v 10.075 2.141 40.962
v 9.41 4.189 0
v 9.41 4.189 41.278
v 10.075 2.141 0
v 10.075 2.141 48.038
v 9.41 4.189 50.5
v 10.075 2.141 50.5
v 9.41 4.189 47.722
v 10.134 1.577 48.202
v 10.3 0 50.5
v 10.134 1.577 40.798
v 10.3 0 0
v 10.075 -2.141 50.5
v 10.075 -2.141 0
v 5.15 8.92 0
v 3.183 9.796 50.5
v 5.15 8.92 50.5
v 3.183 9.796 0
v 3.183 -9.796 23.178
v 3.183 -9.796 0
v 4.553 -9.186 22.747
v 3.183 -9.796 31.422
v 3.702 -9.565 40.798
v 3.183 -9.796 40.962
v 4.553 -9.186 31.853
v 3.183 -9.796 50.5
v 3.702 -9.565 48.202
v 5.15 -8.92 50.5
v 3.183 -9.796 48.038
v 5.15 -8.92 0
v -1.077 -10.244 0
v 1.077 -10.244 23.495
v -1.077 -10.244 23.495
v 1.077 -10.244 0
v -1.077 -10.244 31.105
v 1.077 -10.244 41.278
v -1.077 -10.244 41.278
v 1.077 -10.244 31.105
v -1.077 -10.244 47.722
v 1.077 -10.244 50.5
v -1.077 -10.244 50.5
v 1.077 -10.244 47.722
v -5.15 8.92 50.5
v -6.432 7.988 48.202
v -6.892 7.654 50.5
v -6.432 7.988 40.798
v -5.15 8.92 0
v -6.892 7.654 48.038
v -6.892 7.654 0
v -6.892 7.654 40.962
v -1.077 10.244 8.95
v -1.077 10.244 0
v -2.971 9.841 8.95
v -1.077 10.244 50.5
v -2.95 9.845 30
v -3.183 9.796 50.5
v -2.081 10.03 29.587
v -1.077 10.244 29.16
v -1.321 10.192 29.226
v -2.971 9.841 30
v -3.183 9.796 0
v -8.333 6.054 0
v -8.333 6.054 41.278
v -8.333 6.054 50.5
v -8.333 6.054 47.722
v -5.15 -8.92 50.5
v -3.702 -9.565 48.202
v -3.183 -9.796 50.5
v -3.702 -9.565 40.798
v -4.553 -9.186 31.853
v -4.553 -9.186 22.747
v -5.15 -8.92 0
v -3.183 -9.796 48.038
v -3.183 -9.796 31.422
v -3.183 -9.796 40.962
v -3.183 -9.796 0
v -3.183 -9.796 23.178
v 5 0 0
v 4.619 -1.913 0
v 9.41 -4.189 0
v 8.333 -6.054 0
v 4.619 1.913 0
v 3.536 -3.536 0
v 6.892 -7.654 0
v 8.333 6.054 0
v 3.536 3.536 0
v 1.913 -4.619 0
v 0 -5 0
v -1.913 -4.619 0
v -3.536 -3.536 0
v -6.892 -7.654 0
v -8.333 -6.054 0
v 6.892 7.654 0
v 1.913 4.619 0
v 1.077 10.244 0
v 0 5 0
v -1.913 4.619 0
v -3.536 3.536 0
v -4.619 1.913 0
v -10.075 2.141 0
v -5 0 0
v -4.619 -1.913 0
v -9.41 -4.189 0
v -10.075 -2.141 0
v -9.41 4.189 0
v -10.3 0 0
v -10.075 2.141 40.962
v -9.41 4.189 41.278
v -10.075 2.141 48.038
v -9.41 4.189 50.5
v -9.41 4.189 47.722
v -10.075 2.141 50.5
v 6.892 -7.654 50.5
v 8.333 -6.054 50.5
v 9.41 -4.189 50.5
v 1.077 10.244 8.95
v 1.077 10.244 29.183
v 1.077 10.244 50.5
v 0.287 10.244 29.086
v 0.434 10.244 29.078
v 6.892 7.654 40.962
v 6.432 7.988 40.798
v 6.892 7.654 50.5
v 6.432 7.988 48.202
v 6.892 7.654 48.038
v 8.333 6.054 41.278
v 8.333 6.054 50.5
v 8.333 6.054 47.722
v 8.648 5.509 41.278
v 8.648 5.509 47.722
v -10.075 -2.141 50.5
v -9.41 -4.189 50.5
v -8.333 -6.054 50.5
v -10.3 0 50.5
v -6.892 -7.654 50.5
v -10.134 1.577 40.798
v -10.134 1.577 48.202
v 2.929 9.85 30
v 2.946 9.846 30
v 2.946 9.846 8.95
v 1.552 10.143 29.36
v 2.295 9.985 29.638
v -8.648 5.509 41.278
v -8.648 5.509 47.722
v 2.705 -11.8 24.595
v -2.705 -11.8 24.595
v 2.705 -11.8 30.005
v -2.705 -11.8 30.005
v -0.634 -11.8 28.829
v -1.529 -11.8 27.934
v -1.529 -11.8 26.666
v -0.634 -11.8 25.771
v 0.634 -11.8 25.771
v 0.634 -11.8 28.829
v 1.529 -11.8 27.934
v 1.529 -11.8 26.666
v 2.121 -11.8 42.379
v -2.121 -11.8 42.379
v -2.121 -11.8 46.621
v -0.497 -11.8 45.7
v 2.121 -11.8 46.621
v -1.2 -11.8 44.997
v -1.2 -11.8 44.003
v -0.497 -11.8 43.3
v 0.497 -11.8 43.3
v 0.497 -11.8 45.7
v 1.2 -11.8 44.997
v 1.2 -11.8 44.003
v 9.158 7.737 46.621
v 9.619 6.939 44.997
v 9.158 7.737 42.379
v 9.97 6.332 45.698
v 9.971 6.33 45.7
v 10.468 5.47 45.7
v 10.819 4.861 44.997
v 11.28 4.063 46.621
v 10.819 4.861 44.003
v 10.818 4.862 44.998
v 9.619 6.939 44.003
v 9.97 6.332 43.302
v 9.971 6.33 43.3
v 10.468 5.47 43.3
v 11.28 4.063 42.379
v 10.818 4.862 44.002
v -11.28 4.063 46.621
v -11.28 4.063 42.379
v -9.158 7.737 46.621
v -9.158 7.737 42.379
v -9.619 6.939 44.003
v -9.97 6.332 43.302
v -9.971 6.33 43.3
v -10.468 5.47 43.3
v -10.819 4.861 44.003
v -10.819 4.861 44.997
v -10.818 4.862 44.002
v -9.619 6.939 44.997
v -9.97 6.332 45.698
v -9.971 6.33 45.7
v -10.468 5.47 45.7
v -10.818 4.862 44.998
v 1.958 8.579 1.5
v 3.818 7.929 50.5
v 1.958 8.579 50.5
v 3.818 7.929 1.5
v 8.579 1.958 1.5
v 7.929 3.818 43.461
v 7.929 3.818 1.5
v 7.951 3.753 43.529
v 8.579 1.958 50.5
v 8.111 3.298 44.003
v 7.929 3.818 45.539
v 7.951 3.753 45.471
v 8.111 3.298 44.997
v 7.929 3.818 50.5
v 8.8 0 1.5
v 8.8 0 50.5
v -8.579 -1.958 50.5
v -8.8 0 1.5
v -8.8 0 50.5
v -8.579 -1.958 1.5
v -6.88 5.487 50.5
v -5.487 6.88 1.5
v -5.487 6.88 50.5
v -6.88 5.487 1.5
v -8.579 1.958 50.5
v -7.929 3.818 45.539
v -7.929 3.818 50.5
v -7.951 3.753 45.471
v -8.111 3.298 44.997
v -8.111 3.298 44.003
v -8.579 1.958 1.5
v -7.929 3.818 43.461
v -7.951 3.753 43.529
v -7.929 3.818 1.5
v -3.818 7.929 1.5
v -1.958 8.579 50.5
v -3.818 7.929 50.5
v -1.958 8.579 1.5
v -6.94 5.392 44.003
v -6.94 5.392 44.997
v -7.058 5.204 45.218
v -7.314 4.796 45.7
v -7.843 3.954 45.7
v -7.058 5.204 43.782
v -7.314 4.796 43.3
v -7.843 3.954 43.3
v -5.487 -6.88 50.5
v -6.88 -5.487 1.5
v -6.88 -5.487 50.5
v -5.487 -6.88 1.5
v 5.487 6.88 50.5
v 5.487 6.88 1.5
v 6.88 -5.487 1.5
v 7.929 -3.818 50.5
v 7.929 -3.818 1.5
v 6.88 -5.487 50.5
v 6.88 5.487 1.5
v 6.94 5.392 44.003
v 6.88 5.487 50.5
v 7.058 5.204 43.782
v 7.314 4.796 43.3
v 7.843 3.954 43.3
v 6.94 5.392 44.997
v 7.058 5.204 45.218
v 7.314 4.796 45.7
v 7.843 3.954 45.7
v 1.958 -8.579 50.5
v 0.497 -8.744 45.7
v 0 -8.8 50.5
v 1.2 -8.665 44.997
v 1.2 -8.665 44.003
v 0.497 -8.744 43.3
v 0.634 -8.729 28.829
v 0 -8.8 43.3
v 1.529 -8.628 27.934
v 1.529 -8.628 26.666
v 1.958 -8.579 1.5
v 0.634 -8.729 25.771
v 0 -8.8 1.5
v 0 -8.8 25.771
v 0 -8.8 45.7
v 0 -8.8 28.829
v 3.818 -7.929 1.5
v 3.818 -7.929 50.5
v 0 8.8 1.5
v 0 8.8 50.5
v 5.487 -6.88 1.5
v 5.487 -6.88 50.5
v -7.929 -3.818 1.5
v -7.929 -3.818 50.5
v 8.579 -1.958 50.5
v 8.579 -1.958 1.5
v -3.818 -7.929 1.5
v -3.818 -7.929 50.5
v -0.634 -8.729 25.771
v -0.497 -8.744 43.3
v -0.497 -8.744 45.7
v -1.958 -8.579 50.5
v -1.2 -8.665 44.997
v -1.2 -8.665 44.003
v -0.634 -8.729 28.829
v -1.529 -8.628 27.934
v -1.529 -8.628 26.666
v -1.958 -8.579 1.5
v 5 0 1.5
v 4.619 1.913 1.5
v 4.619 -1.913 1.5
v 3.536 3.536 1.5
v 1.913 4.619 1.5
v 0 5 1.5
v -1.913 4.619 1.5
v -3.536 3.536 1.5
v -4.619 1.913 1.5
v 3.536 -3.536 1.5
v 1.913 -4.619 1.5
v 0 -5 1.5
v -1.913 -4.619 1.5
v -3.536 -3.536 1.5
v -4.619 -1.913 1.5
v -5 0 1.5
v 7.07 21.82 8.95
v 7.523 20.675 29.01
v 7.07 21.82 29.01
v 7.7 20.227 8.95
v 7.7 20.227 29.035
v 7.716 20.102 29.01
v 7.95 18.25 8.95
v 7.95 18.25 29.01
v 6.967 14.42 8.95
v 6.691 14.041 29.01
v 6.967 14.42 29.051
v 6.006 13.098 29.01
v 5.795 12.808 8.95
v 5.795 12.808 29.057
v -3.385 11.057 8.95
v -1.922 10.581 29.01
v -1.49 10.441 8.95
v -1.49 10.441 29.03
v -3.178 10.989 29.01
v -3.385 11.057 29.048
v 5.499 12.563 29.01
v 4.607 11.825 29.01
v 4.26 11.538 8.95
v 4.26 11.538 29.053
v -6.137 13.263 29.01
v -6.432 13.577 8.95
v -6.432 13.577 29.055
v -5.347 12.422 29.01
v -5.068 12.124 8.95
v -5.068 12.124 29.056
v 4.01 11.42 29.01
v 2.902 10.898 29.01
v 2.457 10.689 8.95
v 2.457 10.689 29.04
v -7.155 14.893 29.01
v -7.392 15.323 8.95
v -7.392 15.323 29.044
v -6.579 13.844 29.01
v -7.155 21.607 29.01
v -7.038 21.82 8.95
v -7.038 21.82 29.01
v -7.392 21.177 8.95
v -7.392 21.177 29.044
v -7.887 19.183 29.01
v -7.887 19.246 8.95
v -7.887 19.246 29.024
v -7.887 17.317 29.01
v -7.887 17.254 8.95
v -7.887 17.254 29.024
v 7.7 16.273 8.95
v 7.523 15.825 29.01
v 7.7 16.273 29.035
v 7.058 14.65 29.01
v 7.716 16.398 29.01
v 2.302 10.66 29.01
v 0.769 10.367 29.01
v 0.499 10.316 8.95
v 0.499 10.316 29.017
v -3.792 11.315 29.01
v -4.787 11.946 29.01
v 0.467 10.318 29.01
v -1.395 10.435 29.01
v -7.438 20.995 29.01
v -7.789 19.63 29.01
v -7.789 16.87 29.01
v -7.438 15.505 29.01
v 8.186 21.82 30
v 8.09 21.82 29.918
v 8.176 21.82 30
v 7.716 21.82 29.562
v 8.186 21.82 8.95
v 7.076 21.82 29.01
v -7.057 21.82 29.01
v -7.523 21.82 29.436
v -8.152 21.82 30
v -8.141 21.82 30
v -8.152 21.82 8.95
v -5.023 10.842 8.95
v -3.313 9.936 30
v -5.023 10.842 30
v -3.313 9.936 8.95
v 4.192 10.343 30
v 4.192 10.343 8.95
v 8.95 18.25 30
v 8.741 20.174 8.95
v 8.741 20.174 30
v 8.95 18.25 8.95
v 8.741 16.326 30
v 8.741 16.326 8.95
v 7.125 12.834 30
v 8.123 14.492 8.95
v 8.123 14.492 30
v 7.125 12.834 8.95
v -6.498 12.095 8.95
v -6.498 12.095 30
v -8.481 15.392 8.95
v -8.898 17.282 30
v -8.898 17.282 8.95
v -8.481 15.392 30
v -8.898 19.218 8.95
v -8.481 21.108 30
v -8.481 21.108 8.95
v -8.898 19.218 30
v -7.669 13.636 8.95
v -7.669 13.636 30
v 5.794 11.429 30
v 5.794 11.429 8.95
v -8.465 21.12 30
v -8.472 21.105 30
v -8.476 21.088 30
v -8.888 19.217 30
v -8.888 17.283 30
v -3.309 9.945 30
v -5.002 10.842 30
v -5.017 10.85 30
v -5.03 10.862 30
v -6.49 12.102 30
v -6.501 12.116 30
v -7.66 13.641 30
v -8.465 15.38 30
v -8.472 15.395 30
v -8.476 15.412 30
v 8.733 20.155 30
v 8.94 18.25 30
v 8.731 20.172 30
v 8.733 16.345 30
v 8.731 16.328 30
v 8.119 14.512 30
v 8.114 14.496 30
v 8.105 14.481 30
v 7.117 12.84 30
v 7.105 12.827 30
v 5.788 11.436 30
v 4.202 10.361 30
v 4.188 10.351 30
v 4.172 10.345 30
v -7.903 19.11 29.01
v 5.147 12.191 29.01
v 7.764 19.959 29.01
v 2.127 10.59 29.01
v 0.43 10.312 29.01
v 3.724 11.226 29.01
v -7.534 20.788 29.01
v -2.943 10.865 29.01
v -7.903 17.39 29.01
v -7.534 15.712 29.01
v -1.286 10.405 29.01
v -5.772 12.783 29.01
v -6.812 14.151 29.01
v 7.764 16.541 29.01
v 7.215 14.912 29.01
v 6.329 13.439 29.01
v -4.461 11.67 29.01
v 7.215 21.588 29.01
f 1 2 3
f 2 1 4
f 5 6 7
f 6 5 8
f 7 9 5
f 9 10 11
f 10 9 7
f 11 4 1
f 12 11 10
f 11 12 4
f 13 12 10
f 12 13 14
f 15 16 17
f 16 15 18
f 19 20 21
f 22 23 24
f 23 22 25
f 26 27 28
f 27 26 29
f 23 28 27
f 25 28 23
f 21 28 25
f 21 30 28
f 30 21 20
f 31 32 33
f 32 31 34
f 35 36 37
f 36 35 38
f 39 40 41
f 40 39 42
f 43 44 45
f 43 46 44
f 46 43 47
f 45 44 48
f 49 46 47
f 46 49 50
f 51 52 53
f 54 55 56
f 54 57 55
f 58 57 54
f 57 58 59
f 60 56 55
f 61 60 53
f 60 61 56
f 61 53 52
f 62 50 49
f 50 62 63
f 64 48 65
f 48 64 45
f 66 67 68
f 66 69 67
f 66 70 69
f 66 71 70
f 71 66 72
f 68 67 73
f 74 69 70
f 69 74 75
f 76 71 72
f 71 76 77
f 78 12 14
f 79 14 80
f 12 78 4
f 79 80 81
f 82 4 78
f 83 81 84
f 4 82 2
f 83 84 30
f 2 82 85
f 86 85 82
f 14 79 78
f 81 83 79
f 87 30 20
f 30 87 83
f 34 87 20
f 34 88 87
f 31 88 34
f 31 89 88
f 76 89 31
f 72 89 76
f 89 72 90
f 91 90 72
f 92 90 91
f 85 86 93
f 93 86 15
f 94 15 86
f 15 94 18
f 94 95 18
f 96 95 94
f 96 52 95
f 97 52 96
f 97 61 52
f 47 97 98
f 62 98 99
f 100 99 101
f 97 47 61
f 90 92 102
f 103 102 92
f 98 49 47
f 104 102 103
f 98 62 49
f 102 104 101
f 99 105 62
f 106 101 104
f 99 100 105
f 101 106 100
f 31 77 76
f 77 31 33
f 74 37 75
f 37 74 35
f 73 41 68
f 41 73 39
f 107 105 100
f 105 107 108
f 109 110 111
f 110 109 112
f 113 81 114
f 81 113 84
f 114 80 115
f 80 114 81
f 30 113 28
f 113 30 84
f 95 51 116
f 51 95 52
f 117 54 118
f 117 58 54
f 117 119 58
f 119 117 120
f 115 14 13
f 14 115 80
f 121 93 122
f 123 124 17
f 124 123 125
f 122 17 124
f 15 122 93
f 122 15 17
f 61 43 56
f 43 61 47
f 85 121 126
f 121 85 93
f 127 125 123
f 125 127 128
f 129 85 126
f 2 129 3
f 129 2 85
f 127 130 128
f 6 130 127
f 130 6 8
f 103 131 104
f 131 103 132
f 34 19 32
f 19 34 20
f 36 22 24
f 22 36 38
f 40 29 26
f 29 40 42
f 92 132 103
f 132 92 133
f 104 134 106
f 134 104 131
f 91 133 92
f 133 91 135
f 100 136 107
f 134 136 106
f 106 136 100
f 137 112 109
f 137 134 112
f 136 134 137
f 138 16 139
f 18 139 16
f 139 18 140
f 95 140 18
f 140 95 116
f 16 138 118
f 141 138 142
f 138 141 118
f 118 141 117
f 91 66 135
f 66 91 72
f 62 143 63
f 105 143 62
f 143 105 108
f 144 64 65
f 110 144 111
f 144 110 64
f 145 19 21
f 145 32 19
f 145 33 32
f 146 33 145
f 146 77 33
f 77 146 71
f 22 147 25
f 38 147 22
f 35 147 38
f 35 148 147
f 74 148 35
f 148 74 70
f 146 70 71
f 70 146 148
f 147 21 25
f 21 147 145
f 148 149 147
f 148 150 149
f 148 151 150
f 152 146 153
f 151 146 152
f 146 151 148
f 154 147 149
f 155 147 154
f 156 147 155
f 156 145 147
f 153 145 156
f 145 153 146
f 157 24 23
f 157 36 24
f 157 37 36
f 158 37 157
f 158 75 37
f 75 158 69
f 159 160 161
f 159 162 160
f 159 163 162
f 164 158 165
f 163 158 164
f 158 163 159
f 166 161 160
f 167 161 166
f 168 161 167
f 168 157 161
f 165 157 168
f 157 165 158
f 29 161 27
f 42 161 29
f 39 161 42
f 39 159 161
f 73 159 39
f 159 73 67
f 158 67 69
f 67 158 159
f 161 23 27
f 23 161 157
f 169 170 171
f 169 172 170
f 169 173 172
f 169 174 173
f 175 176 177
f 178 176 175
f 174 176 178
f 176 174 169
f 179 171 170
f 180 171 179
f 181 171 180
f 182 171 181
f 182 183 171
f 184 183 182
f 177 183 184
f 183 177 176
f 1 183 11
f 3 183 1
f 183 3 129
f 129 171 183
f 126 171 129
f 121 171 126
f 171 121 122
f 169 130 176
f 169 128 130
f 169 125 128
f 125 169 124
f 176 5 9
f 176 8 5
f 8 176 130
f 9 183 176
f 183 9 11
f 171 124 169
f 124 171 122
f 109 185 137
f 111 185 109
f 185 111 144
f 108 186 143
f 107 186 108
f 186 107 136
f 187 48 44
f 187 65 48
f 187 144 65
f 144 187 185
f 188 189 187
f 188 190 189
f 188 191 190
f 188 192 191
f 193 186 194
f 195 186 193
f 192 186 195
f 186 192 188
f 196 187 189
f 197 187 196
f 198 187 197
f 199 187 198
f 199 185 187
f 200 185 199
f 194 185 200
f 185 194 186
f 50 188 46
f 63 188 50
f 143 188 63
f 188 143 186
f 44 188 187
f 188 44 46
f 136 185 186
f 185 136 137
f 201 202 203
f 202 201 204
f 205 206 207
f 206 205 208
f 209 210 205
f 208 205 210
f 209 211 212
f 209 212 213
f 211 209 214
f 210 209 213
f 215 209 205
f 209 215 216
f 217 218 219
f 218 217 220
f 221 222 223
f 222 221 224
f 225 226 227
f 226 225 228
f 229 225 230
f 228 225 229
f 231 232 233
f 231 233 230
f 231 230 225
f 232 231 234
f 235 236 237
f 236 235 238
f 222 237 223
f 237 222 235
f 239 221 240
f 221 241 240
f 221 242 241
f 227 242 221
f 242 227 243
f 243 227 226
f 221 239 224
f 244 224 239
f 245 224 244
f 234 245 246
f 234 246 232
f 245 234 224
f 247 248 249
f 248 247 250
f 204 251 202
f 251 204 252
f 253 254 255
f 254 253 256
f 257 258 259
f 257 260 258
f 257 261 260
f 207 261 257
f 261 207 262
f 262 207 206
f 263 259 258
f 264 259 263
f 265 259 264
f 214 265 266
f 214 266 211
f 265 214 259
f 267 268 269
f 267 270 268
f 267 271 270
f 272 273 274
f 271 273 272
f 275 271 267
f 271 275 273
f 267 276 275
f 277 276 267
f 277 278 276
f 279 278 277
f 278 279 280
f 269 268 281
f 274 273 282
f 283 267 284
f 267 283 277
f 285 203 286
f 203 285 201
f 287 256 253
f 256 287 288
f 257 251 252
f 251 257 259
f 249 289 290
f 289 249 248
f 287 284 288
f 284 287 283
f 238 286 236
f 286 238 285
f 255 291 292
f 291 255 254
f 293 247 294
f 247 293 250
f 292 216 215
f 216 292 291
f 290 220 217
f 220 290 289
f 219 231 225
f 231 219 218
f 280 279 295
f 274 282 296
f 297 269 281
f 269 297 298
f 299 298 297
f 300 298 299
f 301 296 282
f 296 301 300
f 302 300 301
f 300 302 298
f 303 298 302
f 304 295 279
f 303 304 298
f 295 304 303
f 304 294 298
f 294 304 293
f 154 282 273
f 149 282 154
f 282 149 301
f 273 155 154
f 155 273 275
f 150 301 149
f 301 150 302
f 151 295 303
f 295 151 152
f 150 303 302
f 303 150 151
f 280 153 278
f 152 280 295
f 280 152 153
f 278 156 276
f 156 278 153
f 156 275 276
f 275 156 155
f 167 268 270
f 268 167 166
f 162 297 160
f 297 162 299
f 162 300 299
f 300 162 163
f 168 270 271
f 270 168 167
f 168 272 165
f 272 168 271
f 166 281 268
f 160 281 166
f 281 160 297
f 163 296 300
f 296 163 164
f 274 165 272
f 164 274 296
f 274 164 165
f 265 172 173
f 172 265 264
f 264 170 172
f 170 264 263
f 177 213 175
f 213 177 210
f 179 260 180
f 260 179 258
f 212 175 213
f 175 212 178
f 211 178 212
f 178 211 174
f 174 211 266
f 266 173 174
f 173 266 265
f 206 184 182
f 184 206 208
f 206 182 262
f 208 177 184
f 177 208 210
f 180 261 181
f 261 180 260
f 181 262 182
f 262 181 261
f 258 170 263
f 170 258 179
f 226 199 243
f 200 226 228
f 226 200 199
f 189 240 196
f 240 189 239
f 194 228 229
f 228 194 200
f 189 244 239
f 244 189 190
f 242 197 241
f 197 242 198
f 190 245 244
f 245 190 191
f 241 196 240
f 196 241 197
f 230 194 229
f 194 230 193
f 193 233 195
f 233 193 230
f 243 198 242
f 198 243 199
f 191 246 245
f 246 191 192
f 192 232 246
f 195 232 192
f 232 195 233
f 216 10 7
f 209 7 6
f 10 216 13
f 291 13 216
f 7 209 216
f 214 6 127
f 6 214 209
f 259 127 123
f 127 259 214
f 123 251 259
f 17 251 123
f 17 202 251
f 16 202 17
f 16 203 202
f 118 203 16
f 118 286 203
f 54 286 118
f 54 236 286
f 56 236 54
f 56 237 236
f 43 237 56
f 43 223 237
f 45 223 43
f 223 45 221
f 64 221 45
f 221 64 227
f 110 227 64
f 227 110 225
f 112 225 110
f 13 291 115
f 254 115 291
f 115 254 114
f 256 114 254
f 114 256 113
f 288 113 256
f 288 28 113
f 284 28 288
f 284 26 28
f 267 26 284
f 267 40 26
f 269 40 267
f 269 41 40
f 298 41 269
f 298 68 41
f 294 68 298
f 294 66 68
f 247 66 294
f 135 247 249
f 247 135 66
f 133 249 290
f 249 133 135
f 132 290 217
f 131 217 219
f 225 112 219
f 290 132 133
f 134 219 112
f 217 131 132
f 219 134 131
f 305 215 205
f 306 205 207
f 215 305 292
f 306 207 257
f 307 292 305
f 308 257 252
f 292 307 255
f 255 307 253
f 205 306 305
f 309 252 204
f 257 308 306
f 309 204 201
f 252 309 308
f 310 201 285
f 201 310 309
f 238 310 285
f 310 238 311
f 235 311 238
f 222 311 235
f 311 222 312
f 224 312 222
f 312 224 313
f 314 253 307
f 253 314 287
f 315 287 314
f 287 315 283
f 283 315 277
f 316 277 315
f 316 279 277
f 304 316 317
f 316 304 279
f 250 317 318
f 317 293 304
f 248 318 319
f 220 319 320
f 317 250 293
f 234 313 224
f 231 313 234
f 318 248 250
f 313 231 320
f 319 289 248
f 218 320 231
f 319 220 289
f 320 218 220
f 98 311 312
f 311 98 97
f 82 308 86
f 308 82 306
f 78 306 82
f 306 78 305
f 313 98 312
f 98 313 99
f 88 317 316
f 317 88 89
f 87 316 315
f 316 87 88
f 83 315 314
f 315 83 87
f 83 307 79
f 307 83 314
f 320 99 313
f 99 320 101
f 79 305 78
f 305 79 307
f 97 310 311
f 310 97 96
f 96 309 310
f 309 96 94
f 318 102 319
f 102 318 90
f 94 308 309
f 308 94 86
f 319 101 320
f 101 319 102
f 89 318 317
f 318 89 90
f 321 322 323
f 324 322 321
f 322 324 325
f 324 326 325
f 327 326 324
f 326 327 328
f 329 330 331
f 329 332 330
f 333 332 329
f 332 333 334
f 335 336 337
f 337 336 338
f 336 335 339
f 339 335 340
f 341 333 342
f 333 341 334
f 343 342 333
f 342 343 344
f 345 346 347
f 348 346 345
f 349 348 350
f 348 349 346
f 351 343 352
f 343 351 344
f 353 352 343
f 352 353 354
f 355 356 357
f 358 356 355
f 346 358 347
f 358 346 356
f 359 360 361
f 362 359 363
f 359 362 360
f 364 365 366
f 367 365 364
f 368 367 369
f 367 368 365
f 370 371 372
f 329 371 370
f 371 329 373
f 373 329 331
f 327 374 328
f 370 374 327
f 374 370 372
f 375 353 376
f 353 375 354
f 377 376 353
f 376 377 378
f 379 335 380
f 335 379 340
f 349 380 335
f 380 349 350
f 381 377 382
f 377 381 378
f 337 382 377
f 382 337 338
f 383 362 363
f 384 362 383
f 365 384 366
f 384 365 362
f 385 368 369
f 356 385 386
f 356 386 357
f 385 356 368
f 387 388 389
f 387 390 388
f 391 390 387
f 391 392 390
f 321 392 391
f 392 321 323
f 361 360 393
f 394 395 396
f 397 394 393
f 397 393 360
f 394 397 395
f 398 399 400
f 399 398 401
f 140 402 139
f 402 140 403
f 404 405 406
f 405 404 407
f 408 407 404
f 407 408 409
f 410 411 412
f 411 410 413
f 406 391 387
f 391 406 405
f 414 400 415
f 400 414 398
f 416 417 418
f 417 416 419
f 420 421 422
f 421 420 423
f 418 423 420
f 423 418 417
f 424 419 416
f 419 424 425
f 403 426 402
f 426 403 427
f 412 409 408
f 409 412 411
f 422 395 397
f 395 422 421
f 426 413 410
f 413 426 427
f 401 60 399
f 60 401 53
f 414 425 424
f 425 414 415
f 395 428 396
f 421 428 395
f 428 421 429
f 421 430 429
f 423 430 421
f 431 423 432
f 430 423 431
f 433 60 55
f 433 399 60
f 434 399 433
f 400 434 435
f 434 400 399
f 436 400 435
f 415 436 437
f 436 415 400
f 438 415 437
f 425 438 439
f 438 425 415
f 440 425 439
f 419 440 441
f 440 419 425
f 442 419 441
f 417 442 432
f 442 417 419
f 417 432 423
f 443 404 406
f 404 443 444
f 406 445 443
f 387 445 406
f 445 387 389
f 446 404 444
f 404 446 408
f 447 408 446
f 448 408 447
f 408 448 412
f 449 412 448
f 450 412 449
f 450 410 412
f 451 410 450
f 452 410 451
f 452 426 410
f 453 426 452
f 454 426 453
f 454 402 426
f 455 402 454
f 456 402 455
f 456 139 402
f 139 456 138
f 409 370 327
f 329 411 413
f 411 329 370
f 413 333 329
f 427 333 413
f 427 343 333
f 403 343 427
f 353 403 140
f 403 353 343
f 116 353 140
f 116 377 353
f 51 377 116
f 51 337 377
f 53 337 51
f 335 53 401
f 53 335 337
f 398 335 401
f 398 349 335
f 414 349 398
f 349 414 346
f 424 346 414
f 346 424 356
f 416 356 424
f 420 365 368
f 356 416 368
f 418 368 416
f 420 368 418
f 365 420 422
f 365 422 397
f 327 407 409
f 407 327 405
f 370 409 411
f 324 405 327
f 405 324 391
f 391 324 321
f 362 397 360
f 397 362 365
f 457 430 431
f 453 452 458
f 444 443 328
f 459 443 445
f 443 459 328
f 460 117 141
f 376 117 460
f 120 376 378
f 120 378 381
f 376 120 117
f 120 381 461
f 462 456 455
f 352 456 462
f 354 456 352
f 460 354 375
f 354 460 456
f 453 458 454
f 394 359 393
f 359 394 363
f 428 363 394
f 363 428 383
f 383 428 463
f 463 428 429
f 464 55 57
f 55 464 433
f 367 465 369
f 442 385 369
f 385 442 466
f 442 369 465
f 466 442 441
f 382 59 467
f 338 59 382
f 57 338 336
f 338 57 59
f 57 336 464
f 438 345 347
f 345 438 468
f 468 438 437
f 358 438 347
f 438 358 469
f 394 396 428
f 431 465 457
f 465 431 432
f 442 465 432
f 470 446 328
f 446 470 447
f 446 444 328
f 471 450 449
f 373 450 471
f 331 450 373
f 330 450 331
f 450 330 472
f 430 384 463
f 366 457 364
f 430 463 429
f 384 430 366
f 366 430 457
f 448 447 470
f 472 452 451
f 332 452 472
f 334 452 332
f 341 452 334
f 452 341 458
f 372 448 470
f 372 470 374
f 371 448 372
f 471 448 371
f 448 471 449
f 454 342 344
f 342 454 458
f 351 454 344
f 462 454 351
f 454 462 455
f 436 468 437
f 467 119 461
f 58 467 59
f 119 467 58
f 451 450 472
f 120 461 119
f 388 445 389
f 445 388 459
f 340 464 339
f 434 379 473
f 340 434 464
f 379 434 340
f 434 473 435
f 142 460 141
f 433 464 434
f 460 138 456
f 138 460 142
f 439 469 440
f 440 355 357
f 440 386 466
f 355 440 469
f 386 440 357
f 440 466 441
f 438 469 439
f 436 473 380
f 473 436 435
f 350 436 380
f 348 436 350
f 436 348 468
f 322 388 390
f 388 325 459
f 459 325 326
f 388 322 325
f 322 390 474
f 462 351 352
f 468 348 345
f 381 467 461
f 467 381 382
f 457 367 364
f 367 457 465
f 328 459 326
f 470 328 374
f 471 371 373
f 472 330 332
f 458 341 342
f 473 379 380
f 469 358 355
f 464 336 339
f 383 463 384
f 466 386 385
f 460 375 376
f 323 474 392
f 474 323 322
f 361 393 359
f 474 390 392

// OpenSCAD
adjustmentRatio = 1/14.;
laserDiameter = 10;
laserButtonStickout = 1.85;
auxButtonStickout = 1.19;
laserButtonDistanceFromBottomOfLaser = 29.3;
auxButtonDistanceFromBottomOfLaser = 22.65;
adjustmentScrewDistance = 44.5;
wallThickness = 1.5;
attachmentLength = 30;
attachmentWallThickness = 1;
blowgunDiameter = 15.9;
bottomStickout = 2;
adjustmentScrewDiameter = 2.4; 
laserButtonScrewDiameter = 3.06; 
auxButtonScrewDiameter = 0; // FIX?

laserButtonDistance = laserButtonDistanceFromBottomOfLaser - bottomStickout;
auxButtonDistance = auxButtonDistanceFromBottomOfLaser - bottomStickout;
totalLength = adjustmentScrewDistance + 6;
lowerLipThickness = 1.5;

tubeInnerRadius = laserDiameter/2 + max(laserButtonStickout + laserButtonDistance * adjustmentRatio, auxButtonStickout + auxButtonDistance * adjustmentRatio);


nudge = 0.01;

module screw(height, angle, diameter, positive) {
    translate([0,0,height]) rotate([90,0,angle]) translate([0,0,tubeInnerRadius-wallThickness])
    if(positive) {
        rotate([0,0,45])
        cylinder(d2=diameter*2.5,d1=diameter*2.5+6*wallThickness,h=3*wallThickness,$fn=4);
    }
    else {
        rotate([0,0,22.5])
        translate([0,0,-nudge]) cylinder(d=diameter*1.082,h=3*wallThickness+2*nudge,$fn=8);
    }
}

module tube() {
    render(convexity=8)
    difference() {
        union() {
            cylinder(h=totalLength+nudge, r=tubeInnerRadius+wallThickness);
            screw(laserButtonDistance, 0, laserButtonScrewDiameter,true);
            screw(adjustmentScrewDistance, 0, adjustmentScrewDiameter,true);
            screw(adjustmentScrewDistance, 120, adjustmentScrewDiameter,true);
            screw(adjustmentScrewDistance, -120, adjustmentScrewDiameter,true);
        }
        translate([0,0,-nudge]) cylinder(h=totalLength+2*nudge, r=tubeInnerRadius);
            screw(laserButtonDistance, 0, laserButtonScrewDiameter,false);
            screw(adjustmentScrewDistance, 0, adjustmentScrewDiameter,false);
            screw(adjustmentScrewDistance, 120, adjustmentScrewDiameter,false);
            screw(adjustmentScrewDistance, -120, adjustmentScrewDiameter,false);
            translate([0,0,totalLength]) cylinder(h=30, r=tubeInnerRadius+wallThickness);
    } 

    render(convexity=8)
    difference() {
        cylinder(h=lowerLipThickness, r=tubeInnerRadius+nudge);
        translate([0,0,-nudge]) cylinder(h=lowerLipThickness+2*nudge, d=laserDiameter);
    }
}

module attachment() {
    render(convexity=5)
    translate([0,blowgunDiameter/2+attachmentWallThickness,0])
    difference() {
                cylinder(h=attachmentLength,d=blowgunDiameter+2*attachmentWallThickness);
        #cube(center=true,blowgunDiameter+2*attachmentWallThickness);
translate([0,0,attachmentLength-attachmentWallThickness+nudge]) cylinder(h=attachmentWallThickness,d1=blowgunDiameter,d2=blowgunDiameter+2*attachmentWallThickness);
        translate([0,0,-nudge]) {
            cylinder(h=attachmentLength+2*nudge,d=blowgunDiameter);
            translate([0,1.4*(attachmentWallThickness+blowgunDiameter/2),0]) linear_extrude(height=attachmentLength+2*nudge) square(center=true, blowgunDiameter+2*attachmentWallThickness+2*nudge);
        }
    }
}

tube();
translate([0,tubeInnerRadius+wallThickness-attachmentWallThickness,0])
attachment();
